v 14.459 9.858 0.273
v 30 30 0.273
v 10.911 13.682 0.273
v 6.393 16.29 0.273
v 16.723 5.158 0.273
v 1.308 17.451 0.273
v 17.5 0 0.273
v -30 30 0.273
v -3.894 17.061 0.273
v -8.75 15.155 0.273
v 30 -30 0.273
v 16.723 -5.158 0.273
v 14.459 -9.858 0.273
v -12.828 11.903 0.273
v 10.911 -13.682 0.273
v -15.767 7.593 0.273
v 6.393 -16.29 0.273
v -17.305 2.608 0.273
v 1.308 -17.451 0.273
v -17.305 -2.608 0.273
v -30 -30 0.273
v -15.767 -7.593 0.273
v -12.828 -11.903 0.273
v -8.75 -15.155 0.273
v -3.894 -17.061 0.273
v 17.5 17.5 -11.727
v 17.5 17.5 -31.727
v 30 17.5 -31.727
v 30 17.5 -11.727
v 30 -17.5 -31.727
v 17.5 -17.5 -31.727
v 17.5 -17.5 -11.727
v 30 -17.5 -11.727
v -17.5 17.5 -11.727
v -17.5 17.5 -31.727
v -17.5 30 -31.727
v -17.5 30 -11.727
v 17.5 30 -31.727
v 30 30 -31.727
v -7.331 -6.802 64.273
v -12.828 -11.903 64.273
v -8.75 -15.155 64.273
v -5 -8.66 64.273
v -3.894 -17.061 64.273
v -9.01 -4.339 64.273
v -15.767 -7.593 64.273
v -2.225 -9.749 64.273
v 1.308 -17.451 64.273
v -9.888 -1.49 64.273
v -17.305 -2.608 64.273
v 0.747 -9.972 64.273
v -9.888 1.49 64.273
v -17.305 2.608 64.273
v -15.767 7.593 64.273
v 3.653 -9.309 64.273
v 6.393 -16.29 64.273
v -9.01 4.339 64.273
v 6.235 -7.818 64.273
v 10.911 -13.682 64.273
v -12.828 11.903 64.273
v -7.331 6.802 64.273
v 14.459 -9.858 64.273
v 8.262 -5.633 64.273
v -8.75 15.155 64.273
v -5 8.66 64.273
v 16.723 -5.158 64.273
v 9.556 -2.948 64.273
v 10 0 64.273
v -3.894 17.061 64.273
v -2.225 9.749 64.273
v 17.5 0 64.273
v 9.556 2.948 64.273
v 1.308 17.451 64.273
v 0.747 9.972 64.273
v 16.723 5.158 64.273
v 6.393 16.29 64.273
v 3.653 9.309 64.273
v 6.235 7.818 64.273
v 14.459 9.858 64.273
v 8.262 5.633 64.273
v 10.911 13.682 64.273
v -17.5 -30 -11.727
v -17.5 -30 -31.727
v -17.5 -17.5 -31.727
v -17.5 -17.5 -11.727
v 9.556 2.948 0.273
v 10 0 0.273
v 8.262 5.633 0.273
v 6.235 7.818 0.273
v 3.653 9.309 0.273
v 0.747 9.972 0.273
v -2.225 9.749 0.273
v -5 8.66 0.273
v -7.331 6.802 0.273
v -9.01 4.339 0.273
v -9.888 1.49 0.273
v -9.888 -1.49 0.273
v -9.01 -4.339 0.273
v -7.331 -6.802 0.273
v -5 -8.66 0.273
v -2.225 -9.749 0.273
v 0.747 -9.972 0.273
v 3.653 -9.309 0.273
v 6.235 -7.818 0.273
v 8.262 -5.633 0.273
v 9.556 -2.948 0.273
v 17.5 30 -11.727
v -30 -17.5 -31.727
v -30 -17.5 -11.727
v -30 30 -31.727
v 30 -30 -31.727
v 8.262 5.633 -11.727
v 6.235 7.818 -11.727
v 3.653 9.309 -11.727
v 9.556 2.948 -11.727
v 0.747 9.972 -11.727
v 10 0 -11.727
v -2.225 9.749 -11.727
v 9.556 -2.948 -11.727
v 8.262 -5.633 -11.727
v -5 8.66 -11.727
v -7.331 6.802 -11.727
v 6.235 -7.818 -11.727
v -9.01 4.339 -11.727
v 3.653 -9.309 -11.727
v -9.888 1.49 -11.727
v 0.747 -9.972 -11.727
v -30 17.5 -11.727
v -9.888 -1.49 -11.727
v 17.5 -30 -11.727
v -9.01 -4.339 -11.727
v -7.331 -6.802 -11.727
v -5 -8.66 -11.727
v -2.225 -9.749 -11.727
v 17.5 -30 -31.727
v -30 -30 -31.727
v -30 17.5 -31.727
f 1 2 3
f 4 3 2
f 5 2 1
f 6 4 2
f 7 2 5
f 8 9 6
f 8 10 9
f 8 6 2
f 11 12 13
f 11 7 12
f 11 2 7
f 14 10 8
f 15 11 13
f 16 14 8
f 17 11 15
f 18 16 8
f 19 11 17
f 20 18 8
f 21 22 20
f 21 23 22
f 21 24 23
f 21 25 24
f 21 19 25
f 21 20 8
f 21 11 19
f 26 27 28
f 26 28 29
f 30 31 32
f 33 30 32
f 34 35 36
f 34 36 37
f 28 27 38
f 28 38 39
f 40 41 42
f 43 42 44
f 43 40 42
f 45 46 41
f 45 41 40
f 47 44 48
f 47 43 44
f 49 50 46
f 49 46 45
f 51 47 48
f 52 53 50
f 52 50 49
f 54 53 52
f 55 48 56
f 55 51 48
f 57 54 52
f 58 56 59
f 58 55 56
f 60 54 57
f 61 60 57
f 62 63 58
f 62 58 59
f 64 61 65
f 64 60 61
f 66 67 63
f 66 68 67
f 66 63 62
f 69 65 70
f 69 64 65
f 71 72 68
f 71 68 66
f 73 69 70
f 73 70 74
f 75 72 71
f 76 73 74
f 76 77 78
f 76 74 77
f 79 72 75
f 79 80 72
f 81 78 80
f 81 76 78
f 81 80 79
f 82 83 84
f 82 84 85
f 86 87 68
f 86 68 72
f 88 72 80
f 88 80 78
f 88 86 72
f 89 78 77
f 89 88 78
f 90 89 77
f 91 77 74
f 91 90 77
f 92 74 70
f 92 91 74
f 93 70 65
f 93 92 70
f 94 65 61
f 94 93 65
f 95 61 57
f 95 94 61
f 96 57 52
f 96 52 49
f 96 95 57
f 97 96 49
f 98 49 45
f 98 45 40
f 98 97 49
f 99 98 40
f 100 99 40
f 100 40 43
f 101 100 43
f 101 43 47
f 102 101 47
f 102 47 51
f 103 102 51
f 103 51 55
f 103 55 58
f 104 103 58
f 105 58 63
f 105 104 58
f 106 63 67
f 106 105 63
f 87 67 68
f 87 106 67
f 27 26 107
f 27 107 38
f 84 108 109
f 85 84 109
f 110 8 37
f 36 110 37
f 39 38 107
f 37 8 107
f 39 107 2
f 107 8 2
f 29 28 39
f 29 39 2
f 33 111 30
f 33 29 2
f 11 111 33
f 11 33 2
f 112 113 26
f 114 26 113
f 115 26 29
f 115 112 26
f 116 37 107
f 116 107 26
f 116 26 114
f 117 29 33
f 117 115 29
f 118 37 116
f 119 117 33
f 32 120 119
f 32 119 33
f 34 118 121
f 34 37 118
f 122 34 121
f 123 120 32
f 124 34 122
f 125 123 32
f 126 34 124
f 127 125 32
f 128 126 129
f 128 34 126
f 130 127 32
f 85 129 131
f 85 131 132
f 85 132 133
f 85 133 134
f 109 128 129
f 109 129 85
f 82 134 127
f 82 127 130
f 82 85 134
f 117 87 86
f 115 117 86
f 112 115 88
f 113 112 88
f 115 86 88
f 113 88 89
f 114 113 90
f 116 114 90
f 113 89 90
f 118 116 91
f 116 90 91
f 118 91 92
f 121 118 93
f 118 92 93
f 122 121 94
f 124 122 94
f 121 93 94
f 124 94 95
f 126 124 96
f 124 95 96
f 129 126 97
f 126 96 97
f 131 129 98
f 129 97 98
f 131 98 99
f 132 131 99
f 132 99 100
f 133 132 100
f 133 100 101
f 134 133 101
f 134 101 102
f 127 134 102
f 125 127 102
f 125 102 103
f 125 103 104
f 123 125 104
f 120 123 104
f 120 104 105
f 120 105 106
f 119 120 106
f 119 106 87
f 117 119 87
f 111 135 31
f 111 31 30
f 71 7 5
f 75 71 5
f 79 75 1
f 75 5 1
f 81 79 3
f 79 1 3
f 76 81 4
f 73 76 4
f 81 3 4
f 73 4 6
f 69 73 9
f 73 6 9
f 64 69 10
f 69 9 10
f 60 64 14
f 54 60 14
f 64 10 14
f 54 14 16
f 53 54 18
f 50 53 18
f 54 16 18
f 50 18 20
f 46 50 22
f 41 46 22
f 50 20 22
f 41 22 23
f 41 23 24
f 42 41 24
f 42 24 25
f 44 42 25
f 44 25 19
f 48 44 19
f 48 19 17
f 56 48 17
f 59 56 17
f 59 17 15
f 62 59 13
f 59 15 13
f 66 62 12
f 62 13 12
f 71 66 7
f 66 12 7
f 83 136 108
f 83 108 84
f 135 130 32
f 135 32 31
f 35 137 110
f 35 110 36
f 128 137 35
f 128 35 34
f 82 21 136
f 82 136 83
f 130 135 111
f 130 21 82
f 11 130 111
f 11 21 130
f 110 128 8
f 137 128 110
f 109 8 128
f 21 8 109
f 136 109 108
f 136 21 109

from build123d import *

# Parameters (mm, degrees)
F1_DEPTH = 30
F2_R     = 17.5
F2_R_2   = 10
F3_DEPTH = 64
F4_DEPTH = 32.001
F5_W     = 35
F5_H     = 20
F6_DEPTH = 93


with BuildPart() as f1:
    # F0 (on Front) → F1 (new body, symmetric)
    with BuildSketch(Plane.XZ):
        Polygon((0, 0.2733823939), (-30, 0.2733823939), (-30, -31.7266176061), (-17.5, -31.7266176061), (-17.5, -11.7266176061), (0, -11.7266176061), (17.5, -11.7266176061), (17.5, -31.7266176061), (30, -31.7266176061), (30, 0.2733823939), align=None)
    extrude(amount=F1_DEPTH, both=True)

    # F2 (on face) → F3 (join)
    with BuildSketch(Plane.XY.offset(0.2733823939)):
        Circle(F2_R)
        Circle(F2_R_2, mode=Mode.SUBTRACT)
    extrude(amount=F3_DEPTH)

    # F4 (cut, through all): a face of the model
    f4_faces = [f1.faces().sort_by_distance(p)[0] for p in [
        (0, 0, 0.2733823939),
    ]]
    extrude(f4_faces, amount=-F4_DEPTH, mode=Mode.SUBTRACT)

    # F5 (on face) → F6 (cut)
    with BuildSketch(Plane(origin=(-30, 0, 0), x_dir=(0, -1, 0), z_dir=(-1, 0, 0))):
        with Locations((0, -21.7266176061)):
            Rectangle(F5_W, F5_H)
    extrude(amount=-F6_DEPTH, mode=Mode.SUBTRACT)


solid = f1.part
